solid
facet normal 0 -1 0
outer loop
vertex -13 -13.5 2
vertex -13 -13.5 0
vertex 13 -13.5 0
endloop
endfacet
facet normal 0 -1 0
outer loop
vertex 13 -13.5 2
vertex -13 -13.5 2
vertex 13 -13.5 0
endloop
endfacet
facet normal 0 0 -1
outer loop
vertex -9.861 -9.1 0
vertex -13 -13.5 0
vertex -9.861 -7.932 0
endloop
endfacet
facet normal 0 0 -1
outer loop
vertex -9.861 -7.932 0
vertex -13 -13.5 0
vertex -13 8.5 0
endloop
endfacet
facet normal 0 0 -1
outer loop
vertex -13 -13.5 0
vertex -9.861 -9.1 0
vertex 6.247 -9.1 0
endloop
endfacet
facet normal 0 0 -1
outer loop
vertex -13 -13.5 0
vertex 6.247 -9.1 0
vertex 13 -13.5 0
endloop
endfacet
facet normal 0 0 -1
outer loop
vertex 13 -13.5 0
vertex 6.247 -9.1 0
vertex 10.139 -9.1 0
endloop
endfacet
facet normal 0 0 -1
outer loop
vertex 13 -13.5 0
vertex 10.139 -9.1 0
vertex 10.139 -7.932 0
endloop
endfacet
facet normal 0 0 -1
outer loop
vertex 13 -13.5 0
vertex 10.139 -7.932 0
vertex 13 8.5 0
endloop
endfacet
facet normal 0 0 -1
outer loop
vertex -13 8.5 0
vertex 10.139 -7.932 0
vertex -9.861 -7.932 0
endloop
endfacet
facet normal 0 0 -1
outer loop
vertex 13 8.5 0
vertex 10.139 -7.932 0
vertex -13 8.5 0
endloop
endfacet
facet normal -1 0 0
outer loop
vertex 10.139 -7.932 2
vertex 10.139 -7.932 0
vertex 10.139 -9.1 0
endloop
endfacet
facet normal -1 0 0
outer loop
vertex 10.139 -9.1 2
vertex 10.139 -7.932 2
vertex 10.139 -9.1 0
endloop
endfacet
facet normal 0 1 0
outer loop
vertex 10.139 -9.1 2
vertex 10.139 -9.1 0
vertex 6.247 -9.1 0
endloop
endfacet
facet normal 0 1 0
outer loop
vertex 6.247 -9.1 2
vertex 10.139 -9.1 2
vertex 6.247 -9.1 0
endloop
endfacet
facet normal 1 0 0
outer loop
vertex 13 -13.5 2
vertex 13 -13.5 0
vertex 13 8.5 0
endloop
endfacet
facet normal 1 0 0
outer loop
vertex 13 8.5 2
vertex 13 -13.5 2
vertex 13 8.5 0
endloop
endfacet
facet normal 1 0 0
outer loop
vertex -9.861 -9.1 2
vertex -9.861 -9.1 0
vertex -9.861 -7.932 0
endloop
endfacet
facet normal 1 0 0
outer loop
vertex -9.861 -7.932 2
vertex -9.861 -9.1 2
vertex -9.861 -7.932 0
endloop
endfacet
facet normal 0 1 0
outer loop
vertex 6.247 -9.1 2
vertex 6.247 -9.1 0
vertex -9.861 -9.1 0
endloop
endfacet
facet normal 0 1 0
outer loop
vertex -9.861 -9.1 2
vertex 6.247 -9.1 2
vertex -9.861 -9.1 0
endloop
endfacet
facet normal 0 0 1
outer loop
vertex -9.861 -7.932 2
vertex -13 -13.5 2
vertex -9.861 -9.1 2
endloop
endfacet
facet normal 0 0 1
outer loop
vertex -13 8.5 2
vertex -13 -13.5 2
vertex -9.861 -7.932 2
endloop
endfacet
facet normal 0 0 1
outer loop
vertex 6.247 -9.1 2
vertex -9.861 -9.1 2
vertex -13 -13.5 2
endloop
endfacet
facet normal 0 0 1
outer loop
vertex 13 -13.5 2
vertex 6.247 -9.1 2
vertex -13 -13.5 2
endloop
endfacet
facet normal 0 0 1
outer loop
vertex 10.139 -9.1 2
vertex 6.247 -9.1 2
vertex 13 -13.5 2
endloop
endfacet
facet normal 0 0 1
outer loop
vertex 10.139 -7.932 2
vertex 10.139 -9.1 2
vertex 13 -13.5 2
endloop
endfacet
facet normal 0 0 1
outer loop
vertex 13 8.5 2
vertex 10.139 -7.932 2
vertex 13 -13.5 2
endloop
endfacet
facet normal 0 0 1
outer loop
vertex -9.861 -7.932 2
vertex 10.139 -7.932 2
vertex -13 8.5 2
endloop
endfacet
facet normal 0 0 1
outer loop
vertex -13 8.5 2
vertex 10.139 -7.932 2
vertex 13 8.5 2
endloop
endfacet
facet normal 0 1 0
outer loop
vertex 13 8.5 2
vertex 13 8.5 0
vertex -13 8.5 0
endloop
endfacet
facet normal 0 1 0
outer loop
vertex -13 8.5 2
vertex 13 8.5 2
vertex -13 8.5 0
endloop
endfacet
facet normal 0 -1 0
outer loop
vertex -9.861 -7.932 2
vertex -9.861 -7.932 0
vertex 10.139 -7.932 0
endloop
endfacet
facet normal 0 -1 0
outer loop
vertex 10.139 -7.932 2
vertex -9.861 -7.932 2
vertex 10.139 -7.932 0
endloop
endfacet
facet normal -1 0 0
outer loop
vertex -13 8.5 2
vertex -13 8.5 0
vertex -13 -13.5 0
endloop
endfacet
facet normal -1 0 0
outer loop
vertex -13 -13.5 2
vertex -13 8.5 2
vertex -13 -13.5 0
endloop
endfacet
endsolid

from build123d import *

# Parameters (mm, degrees)
F1_DEPTH = 2


with BuildPart() as f1:
    # F0 (on Top) → F1 (new body)
    with BuildSketch(Plane.XY):
        Polygon((13, -8.5), (13, 8.5), (-13, 8.5), (-13, -8.5), (-13, -13.5), (6.247106, -13.5), (13, -13.5), align=None)
        Polygon((10.138918, -9.100043), (6.247106, -9.1), (-9.861082, -9.099823), (-9.861082, -7.931823), (10.138918, -7.932043), align=None, mode=Mode.SUBTRACT)
    extrude(amount=F1_DEPTH)


solid = f1.part
